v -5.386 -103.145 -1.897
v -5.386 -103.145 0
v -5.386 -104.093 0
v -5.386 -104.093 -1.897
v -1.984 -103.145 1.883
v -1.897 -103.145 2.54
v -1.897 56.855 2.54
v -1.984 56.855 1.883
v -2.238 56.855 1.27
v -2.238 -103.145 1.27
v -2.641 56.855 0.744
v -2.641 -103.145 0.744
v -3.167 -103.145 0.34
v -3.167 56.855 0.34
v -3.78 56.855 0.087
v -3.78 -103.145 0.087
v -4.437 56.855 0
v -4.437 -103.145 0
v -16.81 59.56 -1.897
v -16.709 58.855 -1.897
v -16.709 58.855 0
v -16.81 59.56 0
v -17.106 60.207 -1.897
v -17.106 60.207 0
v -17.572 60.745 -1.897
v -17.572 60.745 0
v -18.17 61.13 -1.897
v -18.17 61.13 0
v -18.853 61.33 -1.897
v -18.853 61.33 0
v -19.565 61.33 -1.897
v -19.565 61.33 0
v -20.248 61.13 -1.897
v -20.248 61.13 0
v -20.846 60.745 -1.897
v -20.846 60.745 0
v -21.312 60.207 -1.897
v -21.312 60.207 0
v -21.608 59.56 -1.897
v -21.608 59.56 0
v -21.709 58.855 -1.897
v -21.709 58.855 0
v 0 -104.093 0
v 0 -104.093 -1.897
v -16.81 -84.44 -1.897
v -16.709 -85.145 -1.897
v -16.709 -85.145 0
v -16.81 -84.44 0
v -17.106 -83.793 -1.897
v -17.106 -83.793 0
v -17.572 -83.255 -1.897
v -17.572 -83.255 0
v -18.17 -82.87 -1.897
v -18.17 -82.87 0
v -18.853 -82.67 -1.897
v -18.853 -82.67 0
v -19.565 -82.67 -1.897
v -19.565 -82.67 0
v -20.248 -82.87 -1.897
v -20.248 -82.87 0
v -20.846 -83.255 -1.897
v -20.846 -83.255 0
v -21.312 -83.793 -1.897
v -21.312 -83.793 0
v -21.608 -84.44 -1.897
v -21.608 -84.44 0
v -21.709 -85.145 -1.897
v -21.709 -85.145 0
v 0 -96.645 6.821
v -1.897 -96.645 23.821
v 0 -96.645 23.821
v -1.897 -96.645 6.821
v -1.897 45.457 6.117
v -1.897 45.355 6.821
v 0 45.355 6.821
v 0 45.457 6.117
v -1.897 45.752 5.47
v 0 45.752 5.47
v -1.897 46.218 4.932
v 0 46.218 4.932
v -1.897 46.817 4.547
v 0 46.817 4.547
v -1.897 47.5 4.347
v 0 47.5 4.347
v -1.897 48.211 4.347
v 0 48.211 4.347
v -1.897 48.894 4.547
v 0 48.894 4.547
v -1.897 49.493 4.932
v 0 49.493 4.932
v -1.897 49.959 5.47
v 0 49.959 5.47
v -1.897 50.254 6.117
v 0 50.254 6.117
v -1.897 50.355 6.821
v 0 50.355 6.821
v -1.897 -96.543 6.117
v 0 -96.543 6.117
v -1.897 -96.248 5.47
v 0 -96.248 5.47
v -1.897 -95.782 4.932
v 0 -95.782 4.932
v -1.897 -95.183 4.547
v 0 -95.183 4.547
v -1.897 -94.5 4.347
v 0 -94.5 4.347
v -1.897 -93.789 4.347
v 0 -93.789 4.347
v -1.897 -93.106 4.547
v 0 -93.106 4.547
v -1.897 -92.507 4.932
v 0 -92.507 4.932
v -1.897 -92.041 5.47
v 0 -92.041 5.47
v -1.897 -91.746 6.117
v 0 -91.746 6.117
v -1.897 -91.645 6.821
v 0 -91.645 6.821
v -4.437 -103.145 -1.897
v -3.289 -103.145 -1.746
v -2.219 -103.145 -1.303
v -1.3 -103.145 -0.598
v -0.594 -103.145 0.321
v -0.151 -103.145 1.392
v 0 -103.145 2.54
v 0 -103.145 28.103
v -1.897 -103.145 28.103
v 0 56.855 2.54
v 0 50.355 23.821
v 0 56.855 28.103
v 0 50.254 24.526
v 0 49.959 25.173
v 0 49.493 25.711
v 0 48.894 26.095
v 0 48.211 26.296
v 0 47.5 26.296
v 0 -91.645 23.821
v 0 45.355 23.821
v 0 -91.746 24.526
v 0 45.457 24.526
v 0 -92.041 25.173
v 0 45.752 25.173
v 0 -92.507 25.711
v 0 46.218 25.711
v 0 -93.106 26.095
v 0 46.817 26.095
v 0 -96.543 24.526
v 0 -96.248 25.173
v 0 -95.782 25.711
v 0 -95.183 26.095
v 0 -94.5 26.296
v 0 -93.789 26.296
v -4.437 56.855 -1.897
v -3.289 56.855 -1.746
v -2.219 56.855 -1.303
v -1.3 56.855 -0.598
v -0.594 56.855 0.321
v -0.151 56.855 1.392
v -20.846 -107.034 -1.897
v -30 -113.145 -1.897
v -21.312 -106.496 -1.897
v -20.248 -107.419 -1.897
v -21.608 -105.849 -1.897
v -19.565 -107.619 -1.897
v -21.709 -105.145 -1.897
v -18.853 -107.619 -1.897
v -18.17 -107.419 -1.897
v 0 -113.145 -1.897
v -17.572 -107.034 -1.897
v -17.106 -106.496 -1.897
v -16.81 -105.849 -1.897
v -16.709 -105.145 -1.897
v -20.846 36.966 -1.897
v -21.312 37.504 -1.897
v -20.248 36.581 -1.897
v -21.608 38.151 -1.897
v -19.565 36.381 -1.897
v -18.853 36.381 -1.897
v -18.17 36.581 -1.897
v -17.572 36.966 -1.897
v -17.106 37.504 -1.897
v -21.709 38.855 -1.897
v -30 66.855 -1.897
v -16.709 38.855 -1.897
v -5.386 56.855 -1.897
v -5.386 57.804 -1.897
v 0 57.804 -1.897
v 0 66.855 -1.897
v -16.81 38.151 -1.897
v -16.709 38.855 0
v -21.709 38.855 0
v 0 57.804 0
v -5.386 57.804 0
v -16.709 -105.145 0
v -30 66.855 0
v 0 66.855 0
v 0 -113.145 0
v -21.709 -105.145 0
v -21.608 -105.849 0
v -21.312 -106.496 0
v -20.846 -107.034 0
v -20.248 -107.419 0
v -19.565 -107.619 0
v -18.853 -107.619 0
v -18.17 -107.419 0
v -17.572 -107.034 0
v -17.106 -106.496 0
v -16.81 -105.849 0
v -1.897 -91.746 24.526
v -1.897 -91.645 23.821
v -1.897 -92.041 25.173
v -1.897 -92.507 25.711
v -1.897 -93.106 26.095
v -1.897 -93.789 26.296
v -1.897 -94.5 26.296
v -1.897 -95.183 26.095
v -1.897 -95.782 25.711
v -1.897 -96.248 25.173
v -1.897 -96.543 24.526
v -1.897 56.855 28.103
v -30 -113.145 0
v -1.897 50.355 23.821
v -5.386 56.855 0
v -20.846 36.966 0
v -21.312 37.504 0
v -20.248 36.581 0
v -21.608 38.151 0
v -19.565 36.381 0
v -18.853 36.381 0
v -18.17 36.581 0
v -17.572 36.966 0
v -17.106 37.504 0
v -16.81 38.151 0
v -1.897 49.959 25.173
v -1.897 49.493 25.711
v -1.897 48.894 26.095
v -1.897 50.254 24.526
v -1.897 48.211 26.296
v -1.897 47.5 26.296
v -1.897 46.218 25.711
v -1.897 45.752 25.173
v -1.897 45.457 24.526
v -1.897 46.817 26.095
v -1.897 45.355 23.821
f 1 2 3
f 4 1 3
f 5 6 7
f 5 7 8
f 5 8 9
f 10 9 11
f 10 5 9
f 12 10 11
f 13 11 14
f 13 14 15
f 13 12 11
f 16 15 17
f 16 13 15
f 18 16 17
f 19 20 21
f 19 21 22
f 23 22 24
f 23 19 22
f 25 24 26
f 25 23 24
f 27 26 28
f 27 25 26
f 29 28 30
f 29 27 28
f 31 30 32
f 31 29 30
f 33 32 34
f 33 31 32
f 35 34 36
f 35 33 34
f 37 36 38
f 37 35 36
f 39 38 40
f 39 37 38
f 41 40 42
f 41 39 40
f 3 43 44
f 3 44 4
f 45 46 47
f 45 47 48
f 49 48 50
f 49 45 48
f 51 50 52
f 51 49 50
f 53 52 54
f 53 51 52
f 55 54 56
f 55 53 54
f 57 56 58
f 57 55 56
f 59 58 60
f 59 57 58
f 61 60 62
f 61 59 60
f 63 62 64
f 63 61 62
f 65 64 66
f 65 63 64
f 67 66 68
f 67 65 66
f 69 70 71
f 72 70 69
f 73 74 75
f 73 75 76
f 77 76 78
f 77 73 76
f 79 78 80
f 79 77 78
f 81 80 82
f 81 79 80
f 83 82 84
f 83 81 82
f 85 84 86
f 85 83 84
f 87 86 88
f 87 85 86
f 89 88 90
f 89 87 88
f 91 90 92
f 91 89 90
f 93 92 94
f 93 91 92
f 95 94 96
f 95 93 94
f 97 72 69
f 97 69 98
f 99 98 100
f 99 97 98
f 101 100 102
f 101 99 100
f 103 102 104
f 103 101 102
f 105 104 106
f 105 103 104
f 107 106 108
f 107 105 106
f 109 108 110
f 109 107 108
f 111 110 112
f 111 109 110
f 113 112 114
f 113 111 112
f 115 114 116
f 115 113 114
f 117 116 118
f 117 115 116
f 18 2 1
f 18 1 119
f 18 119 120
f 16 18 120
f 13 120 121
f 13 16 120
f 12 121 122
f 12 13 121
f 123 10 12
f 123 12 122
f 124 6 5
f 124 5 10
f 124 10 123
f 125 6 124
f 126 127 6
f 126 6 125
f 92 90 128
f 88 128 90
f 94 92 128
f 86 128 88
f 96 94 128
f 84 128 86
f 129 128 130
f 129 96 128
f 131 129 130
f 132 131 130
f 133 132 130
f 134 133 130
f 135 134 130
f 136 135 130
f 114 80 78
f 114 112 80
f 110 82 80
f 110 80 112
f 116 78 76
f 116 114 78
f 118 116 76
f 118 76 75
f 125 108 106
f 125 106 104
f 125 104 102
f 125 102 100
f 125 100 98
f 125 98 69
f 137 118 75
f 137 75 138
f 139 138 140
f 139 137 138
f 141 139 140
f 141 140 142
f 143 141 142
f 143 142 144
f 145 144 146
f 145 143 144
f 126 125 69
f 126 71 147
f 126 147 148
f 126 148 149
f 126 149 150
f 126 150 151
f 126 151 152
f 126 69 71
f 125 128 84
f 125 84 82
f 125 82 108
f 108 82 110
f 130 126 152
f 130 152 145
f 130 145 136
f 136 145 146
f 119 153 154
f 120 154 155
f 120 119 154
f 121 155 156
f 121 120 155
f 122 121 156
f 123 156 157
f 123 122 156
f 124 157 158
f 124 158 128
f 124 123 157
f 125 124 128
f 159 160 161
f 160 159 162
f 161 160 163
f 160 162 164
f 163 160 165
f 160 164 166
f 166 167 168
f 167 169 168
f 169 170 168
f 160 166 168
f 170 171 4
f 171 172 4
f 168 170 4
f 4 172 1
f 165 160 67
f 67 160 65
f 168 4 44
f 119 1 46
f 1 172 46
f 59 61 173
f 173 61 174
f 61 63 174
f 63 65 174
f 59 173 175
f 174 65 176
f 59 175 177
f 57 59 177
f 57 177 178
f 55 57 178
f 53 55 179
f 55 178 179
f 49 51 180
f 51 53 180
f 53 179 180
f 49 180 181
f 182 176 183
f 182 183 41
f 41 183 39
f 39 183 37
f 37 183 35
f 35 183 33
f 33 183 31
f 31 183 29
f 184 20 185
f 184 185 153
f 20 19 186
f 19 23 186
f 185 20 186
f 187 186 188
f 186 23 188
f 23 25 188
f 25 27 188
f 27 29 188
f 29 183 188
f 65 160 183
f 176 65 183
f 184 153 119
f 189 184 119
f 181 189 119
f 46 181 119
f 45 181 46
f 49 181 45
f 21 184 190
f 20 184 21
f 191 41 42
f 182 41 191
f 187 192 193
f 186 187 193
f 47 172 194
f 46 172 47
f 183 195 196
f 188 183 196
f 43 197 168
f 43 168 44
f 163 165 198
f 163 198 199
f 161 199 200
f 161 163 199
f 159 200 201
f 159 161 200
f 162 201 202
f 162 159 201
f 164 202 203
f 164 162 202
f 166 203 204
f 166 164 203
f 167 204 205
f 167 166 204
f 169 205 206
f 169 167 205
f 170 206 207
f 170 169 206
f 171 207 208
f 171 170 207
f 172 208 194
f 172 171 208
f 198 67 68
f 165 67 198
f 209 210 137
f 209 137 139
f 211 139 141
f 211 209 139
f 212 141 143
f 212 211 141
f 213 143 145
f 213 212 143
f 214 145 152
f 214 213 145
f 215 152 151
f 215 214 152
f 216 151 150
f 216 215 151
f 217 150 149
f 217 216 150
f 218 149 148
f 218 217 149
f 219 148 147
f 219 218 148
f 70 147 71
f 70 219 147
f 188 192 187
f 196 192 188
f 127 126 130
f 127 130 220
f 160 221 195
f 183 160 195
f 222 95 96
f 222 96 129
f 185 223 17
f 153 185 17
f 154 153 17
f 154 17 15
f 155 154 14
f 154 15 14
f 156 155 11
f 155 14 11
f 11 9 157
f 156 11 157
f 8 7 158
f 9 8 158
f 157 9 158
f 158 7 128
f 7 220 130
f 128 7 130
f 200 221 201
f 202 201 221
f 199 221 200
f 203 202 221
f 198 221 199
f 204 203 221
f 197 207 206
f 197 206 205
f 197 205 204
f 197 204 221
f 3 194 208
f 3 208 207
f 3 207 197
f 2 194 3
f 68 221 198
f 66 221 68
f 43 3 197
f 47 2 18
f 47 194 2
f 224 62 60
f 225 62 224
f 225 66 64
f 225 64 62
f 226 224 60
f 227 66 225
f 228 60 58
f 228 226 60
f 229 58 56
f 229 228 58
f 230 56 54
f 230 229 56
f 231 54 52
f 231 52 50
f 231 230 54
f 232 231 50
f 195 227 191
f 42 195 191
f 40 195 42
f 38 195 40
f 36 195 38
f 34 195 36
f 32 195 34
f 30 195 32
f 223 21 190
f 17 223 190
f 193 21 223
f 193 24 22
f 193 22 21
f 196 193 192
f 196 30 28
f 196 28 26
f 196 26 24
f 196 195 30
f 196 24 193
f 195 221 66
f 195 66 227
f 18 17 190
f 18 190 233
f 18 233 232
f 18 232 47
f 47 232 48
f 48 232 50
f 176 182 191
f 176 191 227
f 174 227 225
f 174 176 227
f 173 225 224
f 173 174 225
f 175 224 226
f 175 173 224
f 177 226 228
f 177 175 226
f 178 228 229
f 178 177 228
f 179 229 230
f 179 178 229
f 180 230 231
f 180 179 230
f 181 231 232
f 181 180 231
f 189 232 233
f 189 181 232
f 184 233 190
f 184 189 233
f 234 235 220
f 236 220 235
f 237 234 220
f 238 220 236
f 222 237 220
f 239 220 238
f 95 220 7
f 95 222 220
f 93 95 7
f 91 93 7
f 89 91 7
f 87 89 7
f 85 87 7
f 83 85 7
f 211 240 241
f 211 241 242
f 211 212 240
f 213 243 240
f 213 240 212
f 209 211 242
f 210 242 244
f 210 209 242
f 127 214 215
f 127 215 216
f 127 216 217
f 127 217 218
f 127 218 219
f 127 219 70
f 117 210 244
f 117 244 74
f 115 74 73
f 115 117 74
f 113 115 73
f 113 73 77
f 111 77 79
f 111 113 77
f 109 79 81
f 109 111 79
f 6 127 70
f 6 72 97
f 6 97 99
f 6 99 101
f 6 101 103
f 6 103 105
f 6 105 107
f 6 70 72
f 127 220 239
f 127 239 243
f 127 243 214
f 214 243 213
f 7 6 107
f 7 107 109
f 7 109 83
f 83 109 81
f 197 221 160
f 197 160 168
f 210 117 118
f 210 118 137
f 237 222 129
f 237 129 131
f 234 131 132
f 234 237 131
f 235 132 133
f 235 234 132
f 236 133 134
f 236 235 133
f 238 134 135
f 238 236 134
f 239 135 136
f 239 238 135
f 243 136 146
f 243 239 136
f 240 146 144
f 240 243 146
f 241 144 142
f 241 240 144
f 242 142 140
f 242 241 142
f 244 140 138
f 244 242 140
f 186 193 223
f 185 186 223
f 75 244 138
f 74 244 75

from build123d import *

# Parameters (mm, degrees)
SKETCH1_W                     = 30
SKETCH1_H                     = 180
BASE_FLANGE1_DEPTH            = 1.89738
EDGE_FLANGE1_STRIP_W          = 12.66952
EDGE_FLANGE1_STRIP_H          = 1.89738
EDGE_FLANGE1_STRIP_CUT_DEPTH  = 160
EDGE_FLANGE1_RELIEF_W         = 13.61821
EDGE_FLANGE1_RELIEF_H         = 0.94869
EDGE_FLANGE1_RELIEF_CUT_DEPTH = 1.89738
EDGE_FLANGE1_DEPTH            = 160
CUT_EXTRUDE1_DEPTH            = 10
CUT_EXTRUDE2_DEPTH            = 10


# Sheet-metal steps are written as plain solids
with BuildPart() as part:
    # Sketch1 → Base-Flange1 (new body)
    with BuildSketch(Plane.XY):
        with Locations((-15, -23.144555198)):
            Rectangle(SKETCH1_W, SKETCH1_H)
    extrude(amount=-BASE_FLANGE1_DEPTH)

    # Edge-Flange1 strip (across the edge) → Edge-Flange1 strip cut (cut)
    with BuildSketch(Plane(origin=(0, -103.144555198, 0), x_dir=(-1, 0, 0), z_dir=(0, 1, 0))):
        with Locations((-1.89738, -0.94869)):
            Rectangle(EDGE_FLANGE1_STRIP_W, EDGE_FLANGE1_STRIP_H)
    extrude(amount=EDGE_FLANGE1_STRIP_CUT_DEPTH, mode=Mode.SUBTRACT)

    # Edge-Flange1 relief (on the sheet) → Edge-Flange1 relief cut (cut)
    with BuildSketch(Plane(origin=(-4.43738, -103.144555198, 0), x_dir=(-1, 0, 0), z_dir=(0, 0, 1))):
        with Locations((-5.860415, 0.474345)):
            Rectangle(EDGE_FLANGE1_RELIEF_W, EDGE_FLANGE1_RELIEF_H)
        with Locations((-5.860415, -160.474345)):
            Rectangle(EDGE_FLANGE1_RELIEF_W, EDGE_FLANGE1_RELIEF_H)
    extrude(amount=-EDGE_FLANGE1_RELIEF_CUT_DEPTH, mode=Mode.SUBTRACT)

    # Edge-Flange1 section (across the edge) → Edge-Flange1 (add)
    with BuildSketch(Plane(origin=(0, -103.144555198, 0), x_dir=(-1, 0, 0), z_dir=(0, 1, 0))):
        with BuildLine():
            Line((0, 2.54), (0, 28.10262))
            Line((0, 28.10262), (1.89738, 28.10262))
            Line((1.89738, 28.10262), (1.89738, 2.54))
            ThreePointArc((1.89738, 2.54), (2.641328776, 0.743948776), (4.43738, 0))
            Line((4.43738, 0), (4.43738, -1.89738))
            ThreePointArc((4.43738, -1.89738), (1.299678511, -0.597701489), (0, 2.54))
        make_face()
    extrude(amount=EDGE_FLANGE1_DEPTH)

    # Sketch9 → Cut-Extrude1 (cut)
    with BuildSketch(Plane.ZY.offset(1.89738)):
        with BuildLine():
            Line((23.82131, 45.355444802), (6.82131, 45.355444802))
            ThreePointArc((6.82131, 45.355444802), (4.32131, 47.855444802), (6.82131, 50.355444802))
            Line((6.82131, 50.355444802), (23.82131, 50.355444802))
            ThreePointArc((23.82131, 50.355444802), (26.32131, 47.855444802), (23.82131, 45.355444802))
        make_face()
        with BuildLine():
            Line((6.82131, -91.644555198), (23.82131, -91.644555198))
            ThreePointArc((23.82131, -91.644555198), (26.32131, -94.144555198), (23.82131, -96.644555198))
            Line((23.82131, -96.644555198), (6.82131, -96.644555198))
            ThreePointArc((6.82131, -96.644555198), (4.32131, -94.144555198), (6.82131, -91.644555198))
        make_face()
    extrude(amount=-CUT_EXTRUDE1_DEPTH, mode=Mode.SUBTRACT)

    # Sketch11 → Cut-Extrude2 (cut)
    with BuildSketch(Plane(origin=(0, 0, -1.89738), x_dir=(-1, 0, 0), z_dir=(0, 0, -1))):
        with BuildLine():
            Line((16.708962543, -105.144555198), (16.708962543, -85.144555198))
            ThreePointArc((16.708962543, -85.144555198), (19.208962543, -82.644555198), (21.708962543, -85.144555198))
            Line((21.708962543, -85.144555198), (21.708962543, -105.144555198))
            ThreePointArc((21.708962543, -105.144555198), (19.208962543, -107.644555198), (16.708962543, -105.144555198))
        make_face()
        with BuildLine():
            Line((16.708962543, 38.855444802), (16.708962543, 58.855444802))
            ThreePointArc((16.708962543, 58.855444802), (19.208962543, 61.355444802), (21.708962543, 58.855444802))
            Line((21.708962543, 58.855444802), (21.708962543, 38.855444802))
            ThreePointArc((21.708962543, 38.855444802), (19.208962543, 36.355444802), (16.708962543, 38.855444802))
        make_face()
    extrude(amount=-CUT_EXTRUDE2_DEPTH, mode=Mode.SUBTRACT)


solid = part.part
